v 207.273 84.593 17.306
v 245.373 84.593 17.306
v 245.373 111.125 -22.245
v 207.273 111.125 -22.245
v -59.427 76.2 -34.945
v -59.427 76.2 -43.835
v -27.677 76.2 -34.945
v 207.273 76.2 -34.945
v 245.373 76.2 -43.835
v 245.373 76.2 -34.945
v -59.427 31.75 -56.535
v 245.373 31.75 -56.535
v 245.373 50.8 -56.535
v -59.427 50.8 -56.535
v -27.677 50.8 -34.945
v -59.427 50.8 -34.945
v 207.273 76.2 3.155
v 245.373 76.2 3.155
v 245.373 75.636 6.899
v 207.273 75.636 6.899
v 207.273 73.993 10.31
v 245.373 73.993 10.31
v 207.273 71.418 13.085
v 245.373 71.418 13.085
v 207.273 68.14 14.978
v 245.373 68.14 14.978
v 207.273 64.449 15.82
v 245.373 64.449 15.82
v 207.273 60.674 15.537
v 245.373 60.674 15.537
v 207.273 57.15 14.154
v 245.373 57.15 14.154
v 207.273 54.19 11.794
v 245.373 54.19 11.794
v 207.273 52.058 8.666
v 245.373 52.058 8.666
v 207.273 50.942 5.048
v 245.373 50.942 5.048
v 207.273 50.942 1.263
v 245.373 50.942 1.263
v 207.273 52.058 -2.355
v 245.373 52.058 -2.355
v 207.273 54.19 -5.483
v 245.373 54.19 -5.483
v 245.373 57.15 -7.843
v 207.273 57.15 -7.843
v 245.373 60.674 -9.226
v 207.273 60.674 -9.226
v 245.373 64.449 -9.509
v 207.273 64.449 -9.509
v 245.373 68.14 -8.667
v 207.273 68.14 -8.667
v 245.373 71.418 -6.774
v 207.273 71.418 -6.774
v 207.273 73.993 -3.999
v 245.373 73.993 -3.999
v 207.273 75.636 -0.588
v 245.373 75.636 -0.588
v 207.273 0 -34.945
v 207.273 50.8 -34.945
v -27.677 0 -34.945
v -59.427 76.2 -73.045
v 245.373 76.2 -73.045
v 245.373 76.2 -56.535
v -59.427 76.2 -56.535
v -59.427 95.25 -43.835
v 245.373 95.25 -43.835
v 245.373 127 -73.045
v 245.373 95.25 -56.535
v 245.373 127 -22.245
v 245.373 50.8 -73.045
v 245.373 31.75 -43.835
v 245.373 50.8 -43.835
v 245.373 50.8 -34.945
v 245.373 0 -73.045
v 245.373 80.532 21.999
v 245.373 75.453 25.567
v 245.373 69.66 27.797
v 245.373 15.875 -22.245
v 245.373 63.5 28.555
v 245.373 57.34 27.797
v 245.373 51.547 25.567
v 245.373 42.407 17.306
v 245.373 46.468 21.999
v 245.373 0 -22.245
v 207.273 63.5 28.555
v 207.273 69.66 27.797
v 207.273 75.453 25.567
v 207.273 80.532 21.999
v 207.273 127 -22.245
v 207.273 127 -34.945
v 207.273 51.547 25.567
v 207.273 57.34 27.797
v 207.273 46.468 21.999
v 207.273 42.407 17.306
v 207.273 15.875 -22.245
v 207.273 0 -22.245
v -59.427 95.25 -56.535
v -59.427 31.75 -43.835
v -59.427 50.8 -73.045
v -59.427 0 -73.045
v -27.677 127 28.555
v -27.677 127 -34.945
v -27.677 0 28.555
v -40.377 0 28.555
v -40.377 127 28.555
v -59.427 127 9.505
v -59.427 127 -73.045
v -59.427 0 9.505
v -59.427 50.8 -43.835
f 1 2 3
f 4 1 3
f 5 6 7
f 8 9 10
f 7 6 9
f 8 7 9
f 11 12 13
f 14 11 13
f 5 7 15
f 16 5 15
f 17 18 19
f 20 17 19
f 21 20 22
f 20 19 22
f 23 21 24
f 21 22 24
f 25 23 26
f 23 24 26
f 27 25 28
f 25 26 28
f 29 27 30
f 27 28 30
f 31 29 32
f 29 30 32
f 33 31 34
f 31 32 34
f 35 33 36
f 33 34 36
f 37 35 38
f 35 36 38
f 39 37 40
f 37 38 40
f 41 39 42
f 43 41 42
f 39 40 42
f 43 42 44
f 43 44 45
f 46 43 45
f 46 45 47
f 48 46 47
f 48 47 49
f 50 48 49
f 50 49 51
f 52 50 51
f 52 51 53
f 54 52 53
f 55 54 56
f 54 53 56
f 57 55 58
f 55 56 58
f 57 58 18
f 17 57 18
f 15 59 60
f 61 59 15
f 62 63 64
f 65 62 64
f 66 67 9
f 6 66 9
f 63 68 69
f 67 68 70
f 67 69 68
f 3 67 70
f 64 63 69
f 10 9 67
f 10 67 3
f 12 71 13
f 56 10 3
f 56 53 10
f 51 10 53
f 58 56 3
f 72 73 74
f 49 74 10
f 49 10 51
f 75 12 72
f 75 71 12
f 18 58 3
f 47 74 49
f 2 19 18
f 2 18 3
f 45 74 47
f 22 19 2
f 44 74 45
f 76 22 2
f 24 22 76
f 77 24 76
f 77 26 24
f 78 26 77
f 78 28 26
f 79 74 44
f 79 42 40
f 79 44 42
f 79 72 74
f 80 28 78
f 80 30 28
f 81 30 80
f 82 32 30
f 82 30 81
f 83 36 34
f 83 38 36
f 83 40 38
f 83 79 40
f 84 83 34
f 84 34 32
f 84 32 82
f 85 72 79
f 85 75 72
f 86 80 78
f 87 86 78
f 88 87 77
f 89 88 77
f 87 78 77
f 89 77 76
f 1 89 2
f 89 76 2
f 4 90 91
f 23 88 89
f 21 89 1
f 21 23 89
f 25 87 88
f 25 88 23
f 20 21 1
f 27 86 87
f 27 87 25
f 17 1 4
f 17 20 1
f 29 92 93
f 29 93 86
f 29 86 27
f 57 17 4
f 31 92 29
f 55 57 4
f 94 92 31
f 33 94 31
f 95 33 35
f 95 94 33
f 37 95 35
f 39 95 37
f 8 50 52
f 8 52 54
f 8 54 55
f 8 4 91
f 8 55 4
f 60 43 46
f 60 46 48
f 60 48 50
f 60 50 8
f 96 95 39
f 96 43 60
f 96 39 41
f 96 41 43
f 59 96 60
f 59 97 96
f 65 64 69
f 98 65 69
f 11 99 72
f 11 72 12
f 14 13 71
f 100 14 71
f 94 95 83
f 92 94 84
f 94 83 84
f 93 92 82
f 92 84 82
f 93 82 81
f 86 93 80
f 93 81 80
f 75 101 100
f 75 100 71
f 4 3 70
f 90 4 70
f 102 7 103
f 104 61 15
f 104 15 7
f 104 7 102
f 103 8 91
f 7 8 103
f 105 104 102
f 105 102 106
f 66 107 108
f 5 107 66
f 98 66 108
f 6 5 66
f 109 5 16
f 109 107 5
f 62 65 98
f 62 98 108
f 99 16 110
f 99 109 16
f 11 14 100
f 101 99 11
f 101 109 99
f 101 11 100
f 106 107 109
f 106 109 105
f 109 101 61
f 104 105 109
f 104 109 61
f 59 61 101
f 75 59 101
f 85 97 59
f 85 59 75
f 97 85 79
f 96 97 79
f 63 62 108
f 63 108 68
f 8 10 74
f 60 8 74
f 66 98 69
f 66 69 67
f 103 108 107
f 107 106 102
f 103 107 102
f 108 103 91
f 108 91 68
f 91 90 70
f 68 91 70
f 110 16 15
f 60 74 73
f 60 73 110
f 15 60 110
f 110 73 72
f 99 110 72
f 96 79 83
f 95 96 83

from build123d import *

# Parameters (mm, degrees)
F1_DEPTH = 127
F3_DEPTH = 127
F5_DEPTH = 304.801
F7_DEPTH = 38.1
F8_R     = 12.7
F9_DEPTH = 38.1


with BuildPart() as f1:
    # F0 (on Front) → F1 (new body)
    with BuildSketch(Plane.XZ):
        Polygon((-27.676516, -34.944516), (-27.676516, 28.555484), (-59.426516, 28.555484), (-59.426516, -73.044516), (245.373484, -73.044516), (245.373484, 28.555484), (207.273484, 28.555484), (207.273484, -34.944516), align=None)
    extrude(amount=-F1_DEPTH)

    # F2 (on face) → F3 (cut)
    with BuildSketch(Plane.XZ):
        Polygon((-40.376516, 28.555484), (-59.426516, 28.555484), (-59.426516, 9.505484), align=None)
    extrude(amount=-F3_DEPTH, mode=Mode.SUBTRACT)

    # F4 (on face) → F5 (cut, through all)
    with BuildSketch(Plane.YZ.offset(245.373484)):
        Polygon((50.8, -73.044516), (63.5, -73.044516), (76.2, -73.044516), (76.2, -56.534516), (95.25, -56.534516), (95.25, -43.834516), (76.2, -43.834516), (76.2, -34.944516), (50.8, -34.944516), (50.8, -43.834516), (31.75, -43.834516), (31.75, -56.534516), (50.8, -56.534516), align=None)
    extrude(amount=-F5_DEPTH, mode=Mode.SUBTRACT)

    # F6 (on face) → F7 (cut)
    with BuildSketch(Plane.YZ.offset(245.373484)):
        with BuildLine():
            Line((0, 28.555484), (0, -22.244516))
            Line((0, -22.244516), (15.875, -22.244516))
            Line((15.875, -22.244516), (42.406574, 17.305657))
            ThreePointArc((42.406574, 17.305657), (51.547059, 25.567249), (63.5, 28.555484))
            Line((63.5, 28.555484), (0, 28.555484))
        make_face()
        with BuildLine():
            Line((127, 28.555484), (63.5, 28.555484))
            ThreePointArc((63.5, 28.555484), (75.452941, 25.567249), (84.593426, 17.305657))
            Line((84.593426, 17.305657), (111.125, -22.244516))
            Line((111.125, -22.244516), (127, -22.244516))
            Line((127, -22.244516), (127, 28.555484))
        make_face()
    extrude(amount=-F7_DEPTH, mode=Mode.SUBTRACT)

    # F8 (on face) → F9 (cut)
    with BuildSketch(Plane.YZ.offset(245.373484)):
        with Locations((63.5, 3.155484)):
            Circle(F8_R)
    extrude(amount=-F9_DEPTH, mode=Mode.SUBTRACT)


solid = f1.part
